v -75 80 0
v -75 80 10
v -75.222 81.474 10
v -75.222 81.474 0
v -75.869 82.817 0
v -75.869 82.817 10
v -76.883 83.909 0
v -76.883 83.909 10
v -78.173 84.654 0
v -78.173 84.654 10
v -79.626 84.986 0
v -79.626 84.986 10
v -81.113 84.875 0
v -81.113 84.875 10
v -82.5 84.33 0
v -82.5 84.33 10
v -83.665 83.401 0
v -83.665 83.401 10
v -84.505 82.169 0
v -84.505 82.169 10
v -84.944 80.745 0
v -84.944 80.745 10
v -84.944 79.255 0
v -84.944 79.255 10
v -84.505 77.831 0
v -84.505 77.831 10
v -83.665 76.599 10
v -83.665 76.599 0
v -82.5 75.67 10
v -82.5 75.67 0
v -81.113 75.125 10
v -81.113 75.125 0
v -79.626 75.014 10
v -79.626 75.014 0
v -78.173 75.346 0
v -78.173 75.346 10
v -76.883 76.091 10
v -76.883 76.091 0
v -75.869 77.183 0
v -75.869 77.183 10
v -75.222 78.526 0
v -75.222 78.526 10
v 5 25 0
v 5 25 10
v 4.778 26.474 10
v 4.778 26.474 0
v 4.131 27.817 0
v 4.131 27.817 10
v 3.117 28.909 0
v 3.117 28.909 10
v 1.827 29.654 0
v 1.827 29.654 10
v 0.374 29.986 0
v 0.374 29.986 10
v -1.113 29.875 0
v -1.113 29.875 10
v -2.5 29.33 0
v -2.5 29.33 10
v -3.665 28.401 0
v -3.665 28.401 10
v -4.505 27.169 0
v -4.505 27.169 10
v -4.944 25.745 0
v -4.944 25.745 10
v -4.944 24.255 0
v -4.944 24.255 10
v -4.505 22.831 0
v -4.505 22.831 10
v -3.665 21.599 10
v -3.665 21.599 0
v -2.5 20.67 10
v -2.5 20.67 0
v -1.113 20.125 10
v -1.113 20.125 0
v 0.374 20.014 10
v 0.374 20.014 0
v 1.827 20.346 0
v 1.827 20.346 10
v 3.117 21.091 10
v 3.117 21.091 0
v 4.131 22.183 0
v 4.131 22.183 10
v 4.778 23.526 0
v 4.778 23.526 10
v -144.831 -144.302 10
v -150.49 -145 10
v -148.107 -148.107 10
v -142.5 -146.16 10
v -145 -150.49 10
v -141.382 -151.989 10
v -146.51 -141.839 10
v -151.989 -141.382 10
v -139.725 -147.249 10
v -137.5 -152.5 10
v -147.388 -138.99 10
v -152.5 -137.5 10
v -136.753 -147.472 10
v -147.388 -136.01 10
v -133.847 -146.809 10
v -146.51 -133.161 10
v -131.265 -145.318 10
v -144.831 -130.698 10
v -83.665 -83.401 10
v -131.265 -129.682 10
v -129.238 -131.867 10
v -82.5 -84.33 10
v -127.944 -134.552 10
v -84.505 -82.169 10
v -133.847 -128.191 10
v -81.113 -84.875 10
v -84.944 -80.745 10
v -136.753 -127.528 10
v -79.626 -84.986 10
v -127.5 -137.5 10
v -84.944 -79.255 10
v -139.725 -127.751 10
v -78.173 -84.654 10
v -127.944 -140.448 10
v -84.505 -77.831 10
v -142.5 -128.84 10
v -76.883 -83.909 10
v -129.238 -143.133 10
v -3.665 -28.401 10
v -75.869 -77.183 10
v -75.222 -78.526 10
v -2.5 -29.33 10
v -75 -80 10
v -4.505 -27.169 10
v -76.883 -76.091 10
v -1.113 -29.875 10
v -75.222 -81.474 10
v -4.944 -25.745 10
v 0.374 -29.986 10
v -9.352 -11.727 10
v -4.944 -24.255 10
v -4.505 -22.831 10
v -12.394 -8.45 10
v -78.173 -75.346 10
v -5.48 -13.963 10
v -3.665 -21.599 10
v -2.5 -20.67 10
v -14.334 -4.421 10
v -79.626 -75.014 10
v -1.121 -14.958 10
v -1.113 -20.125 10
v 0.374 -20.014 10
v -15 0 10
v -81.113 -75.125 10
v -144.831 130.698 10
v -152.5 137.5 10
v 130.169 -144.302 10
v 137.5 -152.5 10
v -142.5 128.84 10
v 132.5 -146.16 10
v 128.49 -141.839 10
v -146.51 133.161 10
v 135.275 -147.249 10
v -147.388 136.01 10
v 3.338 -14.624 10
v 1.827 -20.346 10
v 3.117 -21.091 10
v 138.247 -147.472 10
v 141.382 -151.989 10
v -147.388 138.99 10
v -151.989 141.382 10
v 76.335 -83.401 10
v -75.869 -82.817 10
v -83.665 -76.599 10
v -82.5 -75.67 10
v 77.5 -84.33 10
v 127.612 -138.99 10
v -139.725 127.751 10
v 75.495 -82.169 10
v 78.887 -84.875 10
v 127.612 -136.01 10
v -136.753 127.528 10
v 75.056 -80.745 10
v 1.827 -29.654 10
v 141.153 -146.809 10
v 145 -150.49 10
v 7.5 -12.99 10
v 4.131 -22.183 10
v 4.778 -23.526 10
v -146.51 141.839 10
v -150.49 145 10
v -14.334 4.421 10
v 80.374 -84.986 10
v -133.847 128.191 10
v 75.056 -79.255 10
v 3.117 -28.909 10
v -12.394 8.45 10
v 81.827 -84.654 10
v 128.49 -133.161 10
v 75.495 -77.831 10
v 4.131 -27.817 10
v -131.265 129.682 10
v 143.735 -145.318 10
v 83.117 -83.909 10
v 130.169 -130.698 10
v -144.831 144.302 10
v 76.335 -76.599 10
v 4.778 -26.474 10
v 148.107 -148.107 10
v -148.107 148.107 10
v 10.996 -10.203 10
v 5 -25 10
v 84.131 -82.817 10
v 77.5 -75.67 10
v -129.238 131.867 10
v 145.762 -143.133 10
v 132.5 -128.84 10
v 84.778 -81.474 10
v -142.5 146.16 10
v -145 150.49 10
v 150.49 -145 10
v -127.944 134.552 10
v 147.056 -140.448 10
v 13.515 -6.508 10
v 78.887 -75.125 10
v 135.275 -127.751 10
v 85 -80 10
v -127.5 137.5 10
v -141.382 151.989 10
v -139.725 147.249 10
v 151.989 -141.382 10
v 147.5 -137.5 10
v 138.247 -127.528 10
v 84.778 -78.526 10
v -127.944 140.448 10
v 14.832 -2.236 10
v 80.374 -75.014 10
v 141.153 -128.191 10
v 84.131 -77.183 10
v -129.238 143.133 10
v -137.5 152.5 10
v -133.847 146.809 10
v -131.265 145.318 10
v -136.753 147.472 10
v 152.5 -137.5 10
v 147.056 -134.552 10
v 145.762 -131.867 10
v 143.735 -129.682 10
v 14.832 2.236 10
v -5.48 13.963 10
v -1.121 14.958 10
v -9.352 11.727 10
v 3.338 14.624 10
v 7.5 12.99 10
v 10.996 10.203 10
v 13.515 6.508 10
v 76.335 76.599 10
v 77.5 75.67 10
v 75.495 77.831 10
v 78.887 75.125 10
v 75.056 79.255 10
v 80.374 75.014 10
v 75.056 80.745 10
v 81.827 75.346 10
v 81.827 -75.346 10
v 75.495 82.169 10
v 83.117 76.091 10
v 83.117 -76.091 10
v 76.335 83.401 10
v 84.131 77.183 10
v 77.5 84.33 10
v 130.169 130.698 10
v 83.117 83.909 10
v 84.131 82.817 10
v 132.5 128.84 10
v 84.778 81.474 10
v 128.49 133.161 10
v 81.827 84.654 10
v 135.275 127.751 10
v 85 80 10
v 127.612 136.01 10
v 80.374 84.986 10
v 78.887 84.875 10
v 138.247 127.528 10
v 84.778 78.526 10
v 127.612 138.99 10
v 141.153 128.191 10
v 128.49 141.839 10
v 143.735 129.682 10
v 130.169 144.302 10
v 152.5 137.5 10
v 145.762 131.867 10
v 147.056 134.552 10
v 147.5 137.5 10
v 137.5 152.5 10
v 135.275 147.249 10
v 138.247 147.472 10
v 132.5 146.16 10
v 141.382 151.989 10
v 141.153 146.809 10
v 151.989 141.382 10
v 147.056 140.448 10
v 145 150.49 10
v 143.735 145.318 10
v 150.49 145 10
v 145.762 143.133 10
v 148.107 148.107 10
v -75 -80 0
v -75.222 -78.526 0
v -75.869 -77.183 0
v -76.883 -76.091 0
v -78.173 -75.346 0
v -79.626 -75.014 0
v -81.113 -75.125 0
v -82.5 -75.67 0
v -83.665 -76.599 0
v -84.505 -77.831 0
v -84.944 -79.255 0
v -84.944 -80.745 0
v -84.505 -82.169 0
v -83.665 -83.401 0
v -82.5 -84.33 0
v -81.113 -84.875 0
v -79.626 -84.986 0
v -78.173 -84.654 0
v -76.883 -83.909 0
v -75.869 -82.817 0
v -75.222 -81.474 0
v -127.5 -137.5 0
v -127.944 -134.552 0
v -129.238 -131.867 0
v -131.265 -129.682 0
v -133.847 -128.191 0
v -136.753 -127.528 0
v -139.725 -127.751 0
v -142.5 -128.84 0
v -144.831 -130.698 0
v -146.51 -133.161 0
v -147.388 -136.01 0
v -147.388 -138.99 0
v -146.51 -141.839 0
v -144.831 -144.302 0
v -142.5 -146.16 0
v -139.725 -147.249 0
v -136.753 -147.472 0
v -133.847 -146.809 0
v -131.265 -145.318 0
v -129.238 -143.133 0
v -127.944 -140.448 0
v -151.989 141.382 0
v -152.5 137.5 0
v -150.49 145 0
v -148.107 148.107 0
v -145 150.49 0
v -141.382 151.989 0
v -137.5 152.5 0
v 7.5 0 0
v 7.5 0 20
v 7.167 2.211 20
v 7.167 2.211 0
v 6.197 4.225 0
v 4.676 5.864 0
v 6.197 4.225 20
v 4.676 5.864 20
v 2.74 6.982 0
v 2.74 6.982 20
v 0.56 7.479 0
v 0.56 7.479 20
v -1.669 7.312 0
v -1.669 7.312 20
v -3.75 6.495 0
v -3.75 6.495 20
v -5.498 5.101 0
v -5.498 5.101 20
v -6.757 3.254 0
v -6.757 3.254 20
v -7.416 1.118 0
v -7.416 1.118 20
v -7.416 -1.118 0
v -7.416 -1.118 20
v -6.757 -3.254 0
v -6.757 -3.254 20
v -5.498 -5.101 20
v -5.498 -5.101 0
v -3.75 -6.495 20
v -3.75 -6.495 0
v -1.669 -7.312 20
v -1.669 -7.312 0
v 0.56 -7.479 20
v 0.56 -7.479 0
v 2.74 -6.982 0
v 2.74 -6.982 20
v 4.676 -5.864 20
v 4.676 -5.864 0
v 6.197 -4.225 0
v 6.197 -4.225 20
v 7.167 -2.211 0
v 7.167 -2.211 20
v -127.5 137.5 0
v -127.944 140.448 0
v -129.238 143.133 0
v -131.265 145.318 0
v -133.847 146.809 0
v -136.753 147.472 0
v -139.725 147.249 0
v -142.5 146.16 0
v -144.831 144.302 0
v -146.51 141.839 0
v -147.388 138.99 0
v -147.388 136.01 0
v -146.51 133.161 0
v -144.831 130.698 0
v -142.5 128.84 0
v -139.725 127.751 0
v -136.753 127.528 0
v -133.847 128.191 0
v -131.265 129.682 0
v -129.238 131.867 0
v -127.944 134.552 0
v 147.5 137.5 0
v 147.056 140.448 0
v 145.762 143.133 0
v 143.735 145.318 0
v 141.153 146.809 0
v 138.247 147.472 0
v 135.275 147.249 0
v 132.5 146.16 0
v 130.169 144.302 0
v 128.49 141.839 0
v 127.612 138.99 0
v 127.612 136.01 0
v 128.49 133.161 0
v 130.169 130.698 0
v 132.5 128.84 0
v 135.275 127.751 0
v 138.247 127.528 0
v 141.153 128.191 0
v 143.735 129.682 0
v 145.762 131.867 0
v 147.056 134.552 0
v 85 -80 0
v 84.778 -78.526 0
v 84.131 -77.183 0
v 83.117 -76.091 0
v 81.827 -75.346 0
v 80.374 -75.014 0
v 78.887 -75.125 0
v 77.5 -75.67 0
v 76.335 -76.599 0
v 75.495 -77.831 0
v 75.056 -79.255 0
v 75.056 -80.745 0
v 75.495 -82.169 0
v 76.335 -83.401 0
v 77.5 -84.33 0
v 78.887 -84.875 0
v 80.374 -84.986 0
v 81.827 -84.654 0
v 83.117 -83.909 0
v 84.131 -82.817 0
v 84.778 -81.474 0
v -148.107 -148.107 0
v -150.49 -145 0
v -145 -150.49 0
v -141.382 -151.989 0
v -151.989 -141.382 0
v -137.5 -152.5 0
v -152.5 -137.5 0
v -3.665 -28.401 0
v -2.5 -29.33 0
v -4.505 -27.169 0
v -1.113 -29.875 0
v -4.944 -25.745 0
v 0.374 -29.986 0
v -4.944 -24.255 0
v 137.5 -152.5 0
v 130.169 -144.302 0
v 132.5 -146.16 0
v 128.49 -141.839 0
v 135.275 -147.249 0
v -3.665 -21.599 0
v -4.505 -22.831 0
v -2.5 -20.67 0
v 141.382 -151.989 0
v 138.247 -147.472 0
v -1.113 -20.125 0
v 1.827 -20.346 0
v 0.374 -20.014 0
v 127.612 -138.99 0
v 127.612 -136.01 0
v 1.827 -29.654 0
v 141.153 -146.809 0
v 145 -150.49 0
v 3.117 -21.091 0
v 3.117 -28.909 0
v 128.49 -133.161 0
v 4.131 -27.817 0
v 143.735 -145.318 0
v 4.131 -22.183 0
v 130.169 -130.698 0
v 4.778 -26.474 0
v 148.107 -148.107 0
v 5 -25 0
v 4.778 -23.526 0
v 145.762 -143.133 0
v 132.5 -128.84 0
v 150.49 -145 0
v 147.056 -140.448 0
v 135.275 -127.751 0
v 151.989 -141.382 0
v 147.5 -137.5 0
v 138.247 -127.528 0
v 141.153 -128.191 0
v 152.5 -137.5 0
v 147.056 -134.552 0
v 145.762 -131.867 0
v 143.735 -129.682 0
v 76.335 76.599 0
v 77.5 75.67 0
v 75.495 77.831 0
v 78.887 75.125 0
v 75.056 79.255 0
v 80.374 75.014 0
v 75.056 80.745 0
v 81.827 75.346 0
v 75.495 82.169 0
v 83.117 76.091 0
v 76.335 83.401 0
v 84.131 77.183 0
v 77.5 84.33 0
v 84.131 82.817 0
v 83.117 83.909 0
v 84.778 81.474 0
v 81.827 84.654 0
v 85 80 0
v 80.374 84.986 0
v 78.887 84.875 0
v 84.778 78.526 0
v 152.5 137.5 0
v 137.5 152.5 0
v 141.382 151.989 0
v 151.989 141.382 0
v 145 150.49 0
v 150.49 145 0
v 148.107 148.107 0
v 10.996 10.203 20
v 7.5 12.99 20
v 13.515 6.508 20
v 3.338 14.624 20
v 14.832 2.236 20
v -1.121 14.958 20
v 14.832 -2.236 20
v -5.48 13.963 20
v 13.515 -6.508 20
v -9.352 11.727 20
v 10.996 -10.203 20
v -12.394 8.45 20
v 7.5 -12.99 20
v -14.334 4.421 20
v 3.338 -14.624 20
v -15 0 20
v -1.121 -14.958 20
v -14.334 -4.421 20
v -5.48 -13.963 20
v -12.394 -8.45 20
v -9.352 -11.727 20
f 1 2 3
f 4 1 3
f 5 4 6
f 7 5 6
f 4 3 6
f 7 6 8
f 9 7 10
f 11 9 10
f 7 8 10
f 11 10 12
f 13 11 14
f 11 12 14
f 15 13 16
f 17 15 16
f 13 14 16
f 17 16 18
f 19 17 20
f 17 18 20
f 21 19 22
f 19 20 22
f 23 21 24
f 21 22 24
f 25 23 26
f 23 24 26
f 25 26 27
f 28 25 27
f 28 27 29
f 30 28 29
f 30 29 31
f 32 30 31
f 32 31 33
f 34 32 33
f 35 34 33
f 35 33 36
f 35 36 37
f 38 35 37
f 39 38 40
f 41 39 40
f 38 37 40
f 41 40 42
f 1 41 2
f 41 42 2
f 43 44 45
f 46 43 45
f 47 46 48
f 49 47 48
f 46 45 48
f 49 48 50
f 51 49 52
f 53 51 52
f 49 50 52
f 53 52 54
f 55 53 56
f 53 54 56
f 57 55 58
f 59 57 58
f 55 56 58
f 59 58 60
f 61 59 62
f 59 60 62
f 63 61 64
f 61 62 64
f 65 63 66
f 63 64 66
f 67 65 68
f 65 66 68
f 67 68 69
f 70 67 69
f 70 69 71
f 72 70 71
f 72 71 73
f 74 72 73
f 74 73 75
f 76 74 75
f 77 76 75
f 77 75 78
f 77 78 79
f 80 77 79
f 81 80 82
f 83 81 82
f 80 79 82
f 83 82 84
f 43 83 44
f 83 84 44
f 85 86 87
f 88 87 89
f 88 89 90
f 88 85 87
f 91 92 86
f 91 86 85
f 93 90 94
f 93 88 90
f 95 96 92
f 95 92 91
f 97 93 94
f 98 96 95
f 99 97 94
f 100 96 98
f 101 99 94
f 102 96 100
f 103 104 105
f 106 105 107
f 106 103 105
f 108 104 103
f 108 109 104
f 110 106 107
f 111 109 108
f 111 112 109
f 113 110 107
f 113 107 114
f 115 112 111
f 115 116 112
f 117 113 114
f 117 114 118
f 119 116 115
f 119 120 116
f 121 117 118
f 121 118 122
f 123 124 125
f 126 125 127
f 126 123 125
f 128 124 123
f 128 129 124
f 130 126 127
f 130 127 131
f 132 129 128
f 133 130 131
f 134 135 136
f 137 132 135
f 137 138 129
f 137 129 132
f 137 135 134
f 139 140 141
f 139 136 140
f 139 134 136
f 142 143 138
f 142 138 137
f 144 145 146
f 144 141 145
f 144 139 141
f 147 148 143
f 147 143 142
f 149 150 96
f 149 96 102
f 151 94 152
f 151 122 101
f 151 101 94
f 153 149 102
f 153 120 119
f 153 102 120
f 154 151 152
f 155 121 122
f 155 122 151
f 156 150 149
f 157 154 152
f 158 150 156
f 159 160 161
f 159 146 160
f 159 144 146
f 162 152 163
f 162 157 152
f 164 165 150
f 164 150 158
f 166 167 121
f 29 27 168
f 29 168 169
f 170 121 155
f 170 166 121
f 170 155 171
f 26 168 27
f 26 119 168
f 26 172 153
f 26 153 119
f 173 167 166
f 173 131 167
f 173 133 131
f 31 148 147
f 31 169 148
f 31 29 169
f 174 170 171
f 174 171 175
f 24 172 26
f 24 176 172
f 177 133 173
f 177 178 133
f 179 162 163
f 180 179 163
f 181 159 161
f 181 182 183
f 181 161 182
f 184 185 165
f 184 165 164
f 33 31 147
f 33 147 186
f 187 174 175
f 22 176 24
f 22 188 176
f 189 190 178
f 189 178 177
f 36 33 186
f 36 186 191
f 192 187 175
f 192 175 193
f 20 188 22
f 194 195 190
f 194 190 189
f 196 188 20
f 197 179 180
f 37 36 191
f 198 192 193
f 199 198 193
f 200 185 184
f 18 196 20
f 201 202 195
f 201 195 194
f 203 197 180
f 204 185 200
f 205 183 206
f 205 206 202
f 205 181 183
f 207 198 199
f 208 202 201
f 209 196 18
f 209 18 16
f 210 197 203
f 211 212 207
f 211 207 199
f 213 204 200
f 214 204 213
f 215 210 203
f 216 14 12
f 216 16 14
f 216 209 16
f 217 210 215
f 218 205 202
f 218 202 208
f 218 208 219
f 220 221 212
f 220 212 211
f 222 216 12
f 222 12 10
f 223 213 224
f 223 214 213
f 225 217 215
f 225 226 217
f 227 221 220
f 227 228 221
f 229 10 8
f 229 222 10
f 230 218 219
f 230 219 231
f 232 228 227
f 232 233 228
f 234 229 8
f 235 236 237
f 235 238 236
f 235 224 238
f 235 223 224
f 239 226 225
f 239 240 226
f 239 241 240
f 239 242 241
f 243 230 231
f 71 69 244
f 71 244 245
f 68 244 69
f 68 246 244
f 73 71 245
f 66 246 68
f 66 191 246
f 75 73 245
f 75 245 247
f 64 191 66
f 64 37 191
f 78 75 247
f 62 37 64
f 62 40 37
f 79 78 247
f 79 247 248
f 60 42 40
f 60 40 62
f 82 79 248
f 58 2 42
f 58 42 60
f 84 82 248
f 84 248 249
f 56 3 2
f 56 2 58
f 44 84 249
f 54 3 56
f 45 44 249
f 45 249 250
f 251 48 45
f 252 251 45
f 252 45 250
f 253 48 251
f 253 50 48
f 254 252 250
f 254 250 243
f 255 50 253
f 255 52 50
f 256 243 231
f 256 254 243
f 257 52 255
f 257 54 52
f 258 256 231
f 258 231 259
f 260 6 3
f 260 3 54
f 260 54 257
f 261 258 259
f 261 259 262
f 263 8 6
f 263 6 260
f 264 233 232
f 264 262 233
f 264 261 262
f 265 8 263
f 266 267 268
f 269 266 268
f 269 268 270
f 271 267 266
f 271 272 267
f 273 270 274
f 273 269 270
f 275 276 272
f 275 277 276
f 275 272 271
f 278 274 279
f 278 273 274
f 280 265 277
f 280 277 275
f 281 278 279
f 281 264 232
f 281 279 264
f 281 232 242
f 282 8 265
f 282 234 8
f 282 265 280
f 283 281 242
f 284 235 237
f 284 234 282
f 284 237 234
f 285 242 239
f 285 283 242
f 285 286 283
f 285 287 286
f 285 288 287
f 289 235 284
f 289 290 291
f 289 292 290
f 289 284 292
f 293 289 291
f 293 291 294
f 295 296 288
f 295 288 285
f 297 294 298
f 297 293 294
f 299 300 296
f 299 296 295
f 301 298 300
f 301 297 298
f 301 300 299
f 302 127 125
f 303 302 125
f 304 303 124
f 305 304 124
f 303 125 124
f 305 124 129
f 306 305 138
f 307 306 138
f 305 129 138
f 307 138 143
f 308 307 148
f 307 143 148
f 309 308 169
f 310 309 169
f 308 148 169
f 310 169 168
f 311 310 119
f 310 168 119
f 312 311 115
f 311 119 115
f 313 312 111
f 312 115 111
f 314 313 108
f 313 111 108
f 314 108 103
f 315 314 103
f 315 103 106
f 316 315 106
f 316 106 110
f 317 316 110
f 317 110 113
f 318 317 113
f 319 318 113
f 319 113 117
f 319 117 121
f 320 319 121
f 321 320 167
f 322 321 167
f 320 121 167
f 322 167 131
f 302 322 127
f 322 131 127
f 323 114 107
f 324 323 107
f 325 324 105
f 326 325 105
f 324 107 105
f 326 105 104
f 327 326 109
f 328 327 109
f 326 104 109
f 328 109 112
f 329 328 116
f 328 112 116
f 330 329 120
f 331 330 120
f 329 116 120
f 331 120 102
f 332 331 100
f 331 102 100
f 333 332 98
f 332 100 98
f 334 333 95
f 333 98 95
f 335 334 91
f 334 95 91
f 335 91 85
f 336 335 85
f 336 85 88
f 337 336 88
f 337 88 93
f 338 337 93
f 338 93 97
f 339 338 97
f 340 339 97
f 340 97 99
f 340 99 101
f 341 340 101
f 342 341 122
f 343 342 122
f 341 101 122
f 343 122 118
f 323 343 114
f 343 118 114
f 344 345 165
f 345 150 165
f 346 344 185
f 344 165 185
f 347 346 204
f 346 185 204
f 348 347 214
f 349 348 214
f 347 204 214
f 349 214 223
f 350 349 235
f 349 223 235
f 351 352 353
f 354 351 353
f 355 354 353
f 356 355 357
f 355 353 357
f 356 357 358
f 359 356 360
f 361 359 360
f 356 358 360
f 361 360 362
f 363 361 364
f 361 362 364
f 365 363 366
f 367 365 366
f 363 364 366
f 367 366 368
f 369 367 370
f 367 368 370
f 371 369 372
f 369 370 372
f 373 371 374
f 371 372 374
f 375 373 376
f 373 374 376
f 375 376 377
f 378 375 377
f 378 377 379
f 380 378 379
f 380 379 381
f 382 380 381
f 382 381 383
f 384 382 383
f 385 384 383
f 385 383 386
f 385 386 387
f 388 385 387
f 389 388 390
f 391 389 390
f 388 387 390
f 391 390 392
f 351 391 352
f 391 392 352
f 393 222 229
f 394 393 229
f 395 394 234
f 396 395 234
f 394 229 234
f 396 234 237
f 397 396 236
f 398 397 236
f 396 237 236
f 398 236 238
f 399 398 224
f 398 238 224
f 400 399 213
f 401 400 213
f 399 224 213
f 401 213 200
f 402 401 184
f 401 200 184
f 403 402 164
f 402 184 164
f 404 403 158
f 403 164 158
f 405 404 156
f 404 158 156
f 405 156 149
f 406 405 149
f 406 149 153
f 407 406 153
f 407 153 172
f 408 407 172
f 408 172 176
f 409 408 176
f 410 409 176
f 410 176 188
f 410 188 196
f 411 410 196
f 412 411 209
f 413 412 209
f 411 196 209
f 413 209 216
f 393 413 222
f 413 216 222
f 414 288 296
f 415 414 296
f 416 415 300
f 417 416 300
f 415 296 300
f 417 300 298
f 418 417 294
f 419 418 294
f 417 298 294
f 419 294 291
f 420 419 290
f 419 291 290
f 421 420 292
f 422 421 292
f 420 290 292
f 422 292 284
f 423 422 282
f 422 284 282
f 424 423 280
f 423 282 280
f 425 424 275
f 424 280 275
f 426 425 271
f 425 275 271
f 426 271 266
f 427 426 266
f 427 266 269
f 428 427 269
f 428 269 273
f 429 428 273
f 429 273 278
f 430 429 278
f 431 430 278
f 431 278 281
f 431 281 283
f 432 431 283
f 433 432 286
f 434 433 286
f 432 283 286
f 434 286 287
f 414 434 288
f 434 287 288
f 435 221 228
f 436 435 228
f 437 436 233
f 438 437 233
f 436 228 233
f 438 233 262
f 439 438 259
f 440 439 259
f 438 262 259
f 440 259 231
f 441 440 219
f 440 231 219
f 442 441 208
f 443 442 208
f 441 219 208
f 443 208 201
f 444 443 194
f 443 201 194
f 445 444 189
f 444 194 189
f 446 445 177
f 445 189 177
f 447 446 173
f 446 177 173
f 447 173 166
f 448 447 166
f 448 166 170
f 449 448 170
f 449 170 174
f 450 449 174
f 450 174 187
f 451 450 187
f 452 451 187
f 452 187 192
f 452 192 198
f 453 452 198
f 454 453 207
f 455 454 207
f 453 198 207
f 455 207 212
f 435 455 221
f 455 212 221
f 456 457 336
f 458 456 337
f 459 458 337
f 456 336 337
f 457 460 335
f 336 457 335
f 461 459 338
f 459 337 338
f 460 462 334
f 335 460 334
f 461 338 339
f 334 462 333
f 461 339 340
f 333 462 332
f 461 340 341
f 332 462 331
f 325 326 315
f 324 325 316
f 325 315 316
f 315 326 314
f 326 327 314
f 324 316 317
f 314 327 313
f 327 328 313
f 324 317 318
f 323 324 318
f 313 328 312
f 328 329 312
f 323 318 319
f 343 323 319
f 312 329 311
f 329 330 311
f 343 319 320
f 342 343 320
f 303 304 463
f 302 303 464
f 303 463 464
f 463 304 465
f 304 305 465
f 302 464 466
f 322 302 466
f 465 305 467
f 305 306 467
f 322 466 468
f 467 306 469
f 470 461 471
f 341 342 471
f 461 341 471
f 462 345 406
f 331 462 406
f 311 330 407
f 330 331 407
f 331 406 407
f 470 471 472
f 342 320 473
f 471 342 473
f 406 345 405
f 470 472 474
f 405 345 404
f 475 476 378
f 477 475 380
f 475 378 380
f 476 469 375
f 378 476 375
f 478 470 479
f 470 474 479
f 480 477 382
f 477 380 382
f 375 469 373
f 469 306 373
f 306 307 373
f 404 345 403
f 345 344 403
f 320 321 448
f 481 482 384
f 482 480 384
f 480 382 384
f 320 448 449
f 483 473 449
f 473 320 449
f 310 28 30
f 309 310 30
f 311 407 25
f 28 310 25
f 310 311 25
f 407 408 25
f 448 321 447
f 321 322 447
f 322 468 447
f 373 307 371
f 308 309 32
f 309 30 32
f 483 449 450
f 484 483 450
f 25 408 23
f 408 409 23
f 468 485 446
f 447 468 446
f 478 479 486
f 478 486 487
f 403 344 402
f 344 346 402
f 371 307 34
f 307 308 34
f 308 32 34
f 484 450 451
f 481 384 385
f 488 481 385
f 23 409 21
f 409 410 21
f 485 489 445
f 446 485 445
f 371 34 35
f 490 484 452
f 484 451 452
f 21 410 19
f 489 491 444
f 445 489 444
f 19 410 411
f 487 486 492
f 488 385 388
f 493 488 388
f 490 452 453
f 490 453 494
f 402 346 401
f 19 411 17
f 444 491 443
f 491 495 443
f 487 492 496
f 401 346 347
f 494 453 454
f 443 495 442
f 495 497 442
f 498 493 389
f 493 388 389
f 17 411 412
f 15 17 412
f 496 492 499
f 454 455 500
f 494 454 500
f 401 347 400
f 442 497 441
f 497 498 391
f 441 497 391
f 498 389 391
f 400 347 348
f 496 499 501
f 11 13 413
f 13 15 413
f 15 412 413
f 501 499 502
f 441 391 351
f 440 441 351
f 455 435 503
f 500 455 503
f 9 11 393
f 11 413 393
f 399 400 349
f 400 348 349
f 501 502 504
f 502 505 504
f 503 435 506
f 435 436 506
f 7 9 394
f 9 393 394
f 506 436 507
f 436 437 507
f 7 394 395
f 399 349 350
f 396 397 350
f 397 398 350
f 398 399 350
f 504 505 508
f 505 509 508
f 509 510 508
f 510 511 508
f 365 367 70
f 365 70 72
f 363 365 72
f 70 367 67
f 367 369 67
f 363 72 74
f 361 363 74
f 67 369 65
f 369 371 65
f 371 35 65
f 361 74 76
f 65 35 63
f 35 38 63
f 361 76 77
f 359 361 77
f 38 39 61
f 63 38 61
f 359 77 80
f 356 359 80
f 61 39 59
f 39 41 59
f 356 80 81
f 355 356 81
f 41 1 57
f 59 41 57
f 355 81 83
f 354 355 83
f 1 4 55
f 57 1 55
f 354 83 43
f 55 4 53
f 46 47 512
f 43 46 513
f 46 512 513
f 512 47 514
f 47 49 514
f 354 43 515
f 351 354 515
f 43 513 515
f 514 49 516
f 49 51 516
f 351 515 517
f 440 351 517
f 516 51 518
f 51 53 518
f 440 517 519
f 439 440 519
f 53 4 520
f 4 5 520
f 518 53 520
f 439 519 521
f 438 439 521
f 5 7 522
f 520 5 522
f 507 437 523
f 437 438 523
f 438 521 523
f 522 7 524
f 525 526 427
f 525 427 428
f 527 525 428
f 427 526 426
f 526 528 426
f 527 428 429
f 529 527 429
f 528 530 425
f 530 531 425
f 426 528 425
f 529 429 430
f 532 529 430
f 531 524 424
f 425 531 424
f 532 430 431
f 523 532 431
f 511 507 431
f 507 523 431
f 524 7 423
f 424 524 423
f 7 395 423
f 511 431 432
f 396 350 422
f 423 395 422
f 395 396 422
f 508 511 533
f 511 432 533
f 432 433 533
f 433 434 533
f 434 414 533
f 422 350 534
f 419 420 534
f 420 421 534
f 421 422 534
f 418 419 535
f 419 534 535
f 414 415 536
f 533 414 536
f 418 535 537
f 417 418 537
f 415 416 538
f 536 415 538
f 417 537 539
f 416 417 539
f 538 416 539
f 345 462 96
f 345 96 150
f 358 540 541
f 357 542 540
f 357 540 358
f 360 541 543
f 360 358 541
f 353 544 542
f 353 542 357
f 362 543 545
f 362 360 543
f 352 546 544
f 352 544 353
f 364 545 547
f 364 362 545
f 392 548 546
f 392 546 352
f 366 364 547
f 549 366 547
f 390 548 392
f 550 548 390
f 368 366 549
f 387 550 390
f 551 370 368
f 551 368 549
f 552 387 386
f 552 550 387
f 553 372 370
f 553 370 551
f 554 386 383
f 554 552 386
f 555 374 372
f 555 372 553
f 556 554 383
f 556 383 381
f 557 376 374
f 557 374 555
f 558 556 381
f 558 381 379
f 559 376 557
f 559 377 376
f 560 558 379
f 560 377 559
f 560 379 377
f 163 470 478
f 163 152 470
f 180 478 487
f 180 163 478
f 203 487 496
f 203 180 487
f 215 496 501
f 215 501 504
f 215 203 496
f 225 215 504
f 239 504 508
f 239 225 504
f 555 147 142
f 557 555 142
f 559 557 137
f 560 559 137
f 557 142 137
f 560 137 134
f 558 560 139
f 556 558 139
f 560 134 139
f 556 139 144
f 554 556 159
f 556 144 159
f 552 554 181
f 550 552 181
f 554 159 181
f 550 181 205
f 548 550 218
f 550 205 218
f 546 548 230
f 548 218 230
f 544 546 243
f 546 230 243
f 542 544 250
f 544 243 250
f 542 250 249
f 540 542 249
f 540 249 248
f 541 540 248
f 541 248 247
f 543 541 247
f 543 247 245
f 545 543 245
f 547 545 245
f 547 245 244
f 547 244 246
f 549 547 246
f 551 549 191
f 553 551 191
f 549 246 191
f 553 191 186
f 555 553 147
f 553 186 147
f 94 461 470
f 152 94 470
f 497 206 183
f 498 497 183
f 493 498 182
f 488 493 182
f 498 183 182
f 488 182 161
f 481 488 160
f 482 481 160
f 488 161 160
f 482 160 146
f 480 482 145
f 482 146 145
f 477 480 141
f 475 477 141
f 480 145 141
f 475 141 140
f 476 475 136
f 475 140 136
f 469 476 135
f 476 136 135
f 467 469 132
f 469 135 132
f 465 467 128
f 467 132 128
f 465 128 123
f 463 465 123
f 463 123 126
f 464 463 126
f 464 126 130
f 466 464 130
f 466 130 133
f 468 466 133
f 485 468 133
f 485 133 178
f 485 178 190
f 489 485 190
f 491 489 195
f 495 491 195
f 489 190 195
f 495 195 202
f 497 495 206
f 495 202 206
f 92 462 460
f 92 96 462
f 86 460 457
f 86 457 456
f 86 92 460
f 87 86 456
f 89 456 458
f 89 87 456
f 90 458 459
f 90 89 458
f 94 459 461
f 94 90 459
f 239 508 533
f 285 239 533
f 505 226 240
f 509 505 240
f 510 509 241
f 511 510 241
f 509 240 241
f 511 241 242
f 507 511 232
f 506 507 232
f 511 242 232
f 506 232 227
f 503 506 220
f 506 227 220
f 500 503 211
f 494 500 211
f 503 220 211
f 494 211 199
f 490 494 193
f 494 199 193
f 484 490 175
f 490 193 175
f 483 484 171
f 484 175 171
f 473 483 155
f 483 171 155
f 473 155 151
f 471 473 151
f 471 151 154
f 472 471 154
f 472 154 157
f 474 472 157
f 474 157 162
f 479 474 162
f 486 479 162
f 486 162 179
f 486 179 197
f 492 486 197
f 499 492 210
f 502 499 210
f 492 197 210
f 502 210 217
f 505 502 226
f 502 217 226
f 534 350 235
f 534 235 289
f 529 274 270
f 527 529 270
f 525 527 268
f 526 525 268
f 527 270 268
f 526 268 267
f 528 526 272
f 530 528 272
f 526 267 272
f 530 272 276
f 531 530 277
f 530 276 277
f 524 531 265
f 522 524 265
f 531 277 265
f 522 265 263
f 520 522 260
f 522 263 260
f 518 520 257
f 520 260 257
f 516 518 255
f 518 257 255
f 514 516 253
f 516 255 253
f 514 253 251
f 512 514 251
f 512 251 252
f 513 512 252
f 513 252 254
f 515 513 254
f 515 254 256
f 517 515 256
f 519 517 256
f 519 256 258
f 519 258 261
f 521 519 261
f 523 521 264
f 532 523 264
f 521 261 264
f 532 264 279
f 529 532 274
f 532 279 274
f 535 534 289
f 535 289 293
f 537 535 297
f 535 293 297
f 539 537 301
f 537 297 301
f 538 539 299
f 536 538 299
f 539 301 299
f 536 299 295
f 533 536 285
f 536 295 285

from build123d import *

# Parameters (mm, degrees)
ESQUISSE1_W              = 305
ESQUISSE1_H              = 305
BOSS_EXTRU_1_DEPTH       = 10
ESQUISSE2_R              = 10
ENL_V_MAT_EXTRU_10_DEPTH = 10
CONG_2_R                 = 15
ESQUISSE3_R              = 5
ENL_V_MAT_EXTRU_11_DEPTH = 10
ESQUISSE4_R              = 15
BOSS_EXTRU_2_DEPTH       = 10
ESQUISSE5_R              = 7.5
ENL_V_MAT_EXTRU_12_DEPTH = 20
ESQUISSE6_R              = 5
ENL_V_MAT_EXTRU_13_DEPTH = 10


with BuildPart() as part:
    # Esquisse1 → Boss.-Extru.1 (new body)
    with BuildSketch(Plane.XY):
        Rectangle(ESQUISSE1_W, ESQUISSE1_H)
    extrude(amount=BOSS_EXTRU_1_DEPTH)

    # Esquisse2 → Enlèv. mat.-Extru.10 (cut)
    with BuildSketch(Plane.XY.offset(10)):
        with Locations((137.5, 137.5)):
            Circle(ESQUISSE2_R)
        with Locations((137.5, -137.5)):
            Circle(ESQUISSE2_R)
        with Locations((-137.5, -137.5)):
            Circle(ESQUISSE2_R)
        with Locations((-137.5, 137.5)):
            Circle(ESQUISSE2_R)
    extrude(amount=-ENL_V_MAT_EXTRU_10_DEPTH, mode=Mode.SUBTRACT)

    # Congé2
    cong_2_edges = [part.edges().sort_by_distance(p)[0] for p in [
        (-152.5, 152.5, 5),
        (152.5, 152.5, 5),
        (152.5, -152.5, 5),
        (-152.5, -152.5, 5),
    ]]
    fillet(cong_2_edges, radius=CONG_2_R)

    # Esquisse3 → Enlèv. mat.-Extru.11 (cut)
    with BuildSketch(Plane.XY.offset(10)):
        with Locations((80, 80)):
            Circle(ESQUISSE3_R)
        with Locations((80, -80)):
            Circle(ESQUISSE3_R)
        with Locations((-80, -80)):
            Circle(ESQUISSE3_R)
        with Locations((-80, 80)):
            Circle(ESQUISSE3_R)
    extrude(amount=-ENL_V_MAT_EXTRU_11_DEPTH, mode=Mode.SUBTRACT)

    # Esquisse4 → Boss.-Extru.2 (add)
    with BuildSketch(Plane.XY.offset(10)):
        with Locations(Location((0, 0, 0), (0, 0, 180))):
            Circle(ESQUISSE4_R)
    extrude(amount=BOSS_EXTRU_2_DEPTH)

    # Esquisse5 → Enlèv. mat.-Extru.12 (cut)
    with BuildSketch(Plane.XY.offset(20)):
        Circle(ESQUISSE5_R)
    extrude(amount=-ENL_V_MAT_EXTRU_12_DEPTH, mode=Mode.SUBTRACT)

    # Esquisse6 → Enlèv. mat.-Extru.13 (cut)
    with BuildSketch(Plane.XY.offset(10)):
        with Locations((0, 25)):
            Circle(ESQUISSE6_R)
        with Locations((0, -25)):
            Circle(ESQUISSE6_R)
    extrude(amount=-ENL_V_MAT_EXTRU_13_DEPTH, mode=Mode.SUBTRACT)


solid = part.part
